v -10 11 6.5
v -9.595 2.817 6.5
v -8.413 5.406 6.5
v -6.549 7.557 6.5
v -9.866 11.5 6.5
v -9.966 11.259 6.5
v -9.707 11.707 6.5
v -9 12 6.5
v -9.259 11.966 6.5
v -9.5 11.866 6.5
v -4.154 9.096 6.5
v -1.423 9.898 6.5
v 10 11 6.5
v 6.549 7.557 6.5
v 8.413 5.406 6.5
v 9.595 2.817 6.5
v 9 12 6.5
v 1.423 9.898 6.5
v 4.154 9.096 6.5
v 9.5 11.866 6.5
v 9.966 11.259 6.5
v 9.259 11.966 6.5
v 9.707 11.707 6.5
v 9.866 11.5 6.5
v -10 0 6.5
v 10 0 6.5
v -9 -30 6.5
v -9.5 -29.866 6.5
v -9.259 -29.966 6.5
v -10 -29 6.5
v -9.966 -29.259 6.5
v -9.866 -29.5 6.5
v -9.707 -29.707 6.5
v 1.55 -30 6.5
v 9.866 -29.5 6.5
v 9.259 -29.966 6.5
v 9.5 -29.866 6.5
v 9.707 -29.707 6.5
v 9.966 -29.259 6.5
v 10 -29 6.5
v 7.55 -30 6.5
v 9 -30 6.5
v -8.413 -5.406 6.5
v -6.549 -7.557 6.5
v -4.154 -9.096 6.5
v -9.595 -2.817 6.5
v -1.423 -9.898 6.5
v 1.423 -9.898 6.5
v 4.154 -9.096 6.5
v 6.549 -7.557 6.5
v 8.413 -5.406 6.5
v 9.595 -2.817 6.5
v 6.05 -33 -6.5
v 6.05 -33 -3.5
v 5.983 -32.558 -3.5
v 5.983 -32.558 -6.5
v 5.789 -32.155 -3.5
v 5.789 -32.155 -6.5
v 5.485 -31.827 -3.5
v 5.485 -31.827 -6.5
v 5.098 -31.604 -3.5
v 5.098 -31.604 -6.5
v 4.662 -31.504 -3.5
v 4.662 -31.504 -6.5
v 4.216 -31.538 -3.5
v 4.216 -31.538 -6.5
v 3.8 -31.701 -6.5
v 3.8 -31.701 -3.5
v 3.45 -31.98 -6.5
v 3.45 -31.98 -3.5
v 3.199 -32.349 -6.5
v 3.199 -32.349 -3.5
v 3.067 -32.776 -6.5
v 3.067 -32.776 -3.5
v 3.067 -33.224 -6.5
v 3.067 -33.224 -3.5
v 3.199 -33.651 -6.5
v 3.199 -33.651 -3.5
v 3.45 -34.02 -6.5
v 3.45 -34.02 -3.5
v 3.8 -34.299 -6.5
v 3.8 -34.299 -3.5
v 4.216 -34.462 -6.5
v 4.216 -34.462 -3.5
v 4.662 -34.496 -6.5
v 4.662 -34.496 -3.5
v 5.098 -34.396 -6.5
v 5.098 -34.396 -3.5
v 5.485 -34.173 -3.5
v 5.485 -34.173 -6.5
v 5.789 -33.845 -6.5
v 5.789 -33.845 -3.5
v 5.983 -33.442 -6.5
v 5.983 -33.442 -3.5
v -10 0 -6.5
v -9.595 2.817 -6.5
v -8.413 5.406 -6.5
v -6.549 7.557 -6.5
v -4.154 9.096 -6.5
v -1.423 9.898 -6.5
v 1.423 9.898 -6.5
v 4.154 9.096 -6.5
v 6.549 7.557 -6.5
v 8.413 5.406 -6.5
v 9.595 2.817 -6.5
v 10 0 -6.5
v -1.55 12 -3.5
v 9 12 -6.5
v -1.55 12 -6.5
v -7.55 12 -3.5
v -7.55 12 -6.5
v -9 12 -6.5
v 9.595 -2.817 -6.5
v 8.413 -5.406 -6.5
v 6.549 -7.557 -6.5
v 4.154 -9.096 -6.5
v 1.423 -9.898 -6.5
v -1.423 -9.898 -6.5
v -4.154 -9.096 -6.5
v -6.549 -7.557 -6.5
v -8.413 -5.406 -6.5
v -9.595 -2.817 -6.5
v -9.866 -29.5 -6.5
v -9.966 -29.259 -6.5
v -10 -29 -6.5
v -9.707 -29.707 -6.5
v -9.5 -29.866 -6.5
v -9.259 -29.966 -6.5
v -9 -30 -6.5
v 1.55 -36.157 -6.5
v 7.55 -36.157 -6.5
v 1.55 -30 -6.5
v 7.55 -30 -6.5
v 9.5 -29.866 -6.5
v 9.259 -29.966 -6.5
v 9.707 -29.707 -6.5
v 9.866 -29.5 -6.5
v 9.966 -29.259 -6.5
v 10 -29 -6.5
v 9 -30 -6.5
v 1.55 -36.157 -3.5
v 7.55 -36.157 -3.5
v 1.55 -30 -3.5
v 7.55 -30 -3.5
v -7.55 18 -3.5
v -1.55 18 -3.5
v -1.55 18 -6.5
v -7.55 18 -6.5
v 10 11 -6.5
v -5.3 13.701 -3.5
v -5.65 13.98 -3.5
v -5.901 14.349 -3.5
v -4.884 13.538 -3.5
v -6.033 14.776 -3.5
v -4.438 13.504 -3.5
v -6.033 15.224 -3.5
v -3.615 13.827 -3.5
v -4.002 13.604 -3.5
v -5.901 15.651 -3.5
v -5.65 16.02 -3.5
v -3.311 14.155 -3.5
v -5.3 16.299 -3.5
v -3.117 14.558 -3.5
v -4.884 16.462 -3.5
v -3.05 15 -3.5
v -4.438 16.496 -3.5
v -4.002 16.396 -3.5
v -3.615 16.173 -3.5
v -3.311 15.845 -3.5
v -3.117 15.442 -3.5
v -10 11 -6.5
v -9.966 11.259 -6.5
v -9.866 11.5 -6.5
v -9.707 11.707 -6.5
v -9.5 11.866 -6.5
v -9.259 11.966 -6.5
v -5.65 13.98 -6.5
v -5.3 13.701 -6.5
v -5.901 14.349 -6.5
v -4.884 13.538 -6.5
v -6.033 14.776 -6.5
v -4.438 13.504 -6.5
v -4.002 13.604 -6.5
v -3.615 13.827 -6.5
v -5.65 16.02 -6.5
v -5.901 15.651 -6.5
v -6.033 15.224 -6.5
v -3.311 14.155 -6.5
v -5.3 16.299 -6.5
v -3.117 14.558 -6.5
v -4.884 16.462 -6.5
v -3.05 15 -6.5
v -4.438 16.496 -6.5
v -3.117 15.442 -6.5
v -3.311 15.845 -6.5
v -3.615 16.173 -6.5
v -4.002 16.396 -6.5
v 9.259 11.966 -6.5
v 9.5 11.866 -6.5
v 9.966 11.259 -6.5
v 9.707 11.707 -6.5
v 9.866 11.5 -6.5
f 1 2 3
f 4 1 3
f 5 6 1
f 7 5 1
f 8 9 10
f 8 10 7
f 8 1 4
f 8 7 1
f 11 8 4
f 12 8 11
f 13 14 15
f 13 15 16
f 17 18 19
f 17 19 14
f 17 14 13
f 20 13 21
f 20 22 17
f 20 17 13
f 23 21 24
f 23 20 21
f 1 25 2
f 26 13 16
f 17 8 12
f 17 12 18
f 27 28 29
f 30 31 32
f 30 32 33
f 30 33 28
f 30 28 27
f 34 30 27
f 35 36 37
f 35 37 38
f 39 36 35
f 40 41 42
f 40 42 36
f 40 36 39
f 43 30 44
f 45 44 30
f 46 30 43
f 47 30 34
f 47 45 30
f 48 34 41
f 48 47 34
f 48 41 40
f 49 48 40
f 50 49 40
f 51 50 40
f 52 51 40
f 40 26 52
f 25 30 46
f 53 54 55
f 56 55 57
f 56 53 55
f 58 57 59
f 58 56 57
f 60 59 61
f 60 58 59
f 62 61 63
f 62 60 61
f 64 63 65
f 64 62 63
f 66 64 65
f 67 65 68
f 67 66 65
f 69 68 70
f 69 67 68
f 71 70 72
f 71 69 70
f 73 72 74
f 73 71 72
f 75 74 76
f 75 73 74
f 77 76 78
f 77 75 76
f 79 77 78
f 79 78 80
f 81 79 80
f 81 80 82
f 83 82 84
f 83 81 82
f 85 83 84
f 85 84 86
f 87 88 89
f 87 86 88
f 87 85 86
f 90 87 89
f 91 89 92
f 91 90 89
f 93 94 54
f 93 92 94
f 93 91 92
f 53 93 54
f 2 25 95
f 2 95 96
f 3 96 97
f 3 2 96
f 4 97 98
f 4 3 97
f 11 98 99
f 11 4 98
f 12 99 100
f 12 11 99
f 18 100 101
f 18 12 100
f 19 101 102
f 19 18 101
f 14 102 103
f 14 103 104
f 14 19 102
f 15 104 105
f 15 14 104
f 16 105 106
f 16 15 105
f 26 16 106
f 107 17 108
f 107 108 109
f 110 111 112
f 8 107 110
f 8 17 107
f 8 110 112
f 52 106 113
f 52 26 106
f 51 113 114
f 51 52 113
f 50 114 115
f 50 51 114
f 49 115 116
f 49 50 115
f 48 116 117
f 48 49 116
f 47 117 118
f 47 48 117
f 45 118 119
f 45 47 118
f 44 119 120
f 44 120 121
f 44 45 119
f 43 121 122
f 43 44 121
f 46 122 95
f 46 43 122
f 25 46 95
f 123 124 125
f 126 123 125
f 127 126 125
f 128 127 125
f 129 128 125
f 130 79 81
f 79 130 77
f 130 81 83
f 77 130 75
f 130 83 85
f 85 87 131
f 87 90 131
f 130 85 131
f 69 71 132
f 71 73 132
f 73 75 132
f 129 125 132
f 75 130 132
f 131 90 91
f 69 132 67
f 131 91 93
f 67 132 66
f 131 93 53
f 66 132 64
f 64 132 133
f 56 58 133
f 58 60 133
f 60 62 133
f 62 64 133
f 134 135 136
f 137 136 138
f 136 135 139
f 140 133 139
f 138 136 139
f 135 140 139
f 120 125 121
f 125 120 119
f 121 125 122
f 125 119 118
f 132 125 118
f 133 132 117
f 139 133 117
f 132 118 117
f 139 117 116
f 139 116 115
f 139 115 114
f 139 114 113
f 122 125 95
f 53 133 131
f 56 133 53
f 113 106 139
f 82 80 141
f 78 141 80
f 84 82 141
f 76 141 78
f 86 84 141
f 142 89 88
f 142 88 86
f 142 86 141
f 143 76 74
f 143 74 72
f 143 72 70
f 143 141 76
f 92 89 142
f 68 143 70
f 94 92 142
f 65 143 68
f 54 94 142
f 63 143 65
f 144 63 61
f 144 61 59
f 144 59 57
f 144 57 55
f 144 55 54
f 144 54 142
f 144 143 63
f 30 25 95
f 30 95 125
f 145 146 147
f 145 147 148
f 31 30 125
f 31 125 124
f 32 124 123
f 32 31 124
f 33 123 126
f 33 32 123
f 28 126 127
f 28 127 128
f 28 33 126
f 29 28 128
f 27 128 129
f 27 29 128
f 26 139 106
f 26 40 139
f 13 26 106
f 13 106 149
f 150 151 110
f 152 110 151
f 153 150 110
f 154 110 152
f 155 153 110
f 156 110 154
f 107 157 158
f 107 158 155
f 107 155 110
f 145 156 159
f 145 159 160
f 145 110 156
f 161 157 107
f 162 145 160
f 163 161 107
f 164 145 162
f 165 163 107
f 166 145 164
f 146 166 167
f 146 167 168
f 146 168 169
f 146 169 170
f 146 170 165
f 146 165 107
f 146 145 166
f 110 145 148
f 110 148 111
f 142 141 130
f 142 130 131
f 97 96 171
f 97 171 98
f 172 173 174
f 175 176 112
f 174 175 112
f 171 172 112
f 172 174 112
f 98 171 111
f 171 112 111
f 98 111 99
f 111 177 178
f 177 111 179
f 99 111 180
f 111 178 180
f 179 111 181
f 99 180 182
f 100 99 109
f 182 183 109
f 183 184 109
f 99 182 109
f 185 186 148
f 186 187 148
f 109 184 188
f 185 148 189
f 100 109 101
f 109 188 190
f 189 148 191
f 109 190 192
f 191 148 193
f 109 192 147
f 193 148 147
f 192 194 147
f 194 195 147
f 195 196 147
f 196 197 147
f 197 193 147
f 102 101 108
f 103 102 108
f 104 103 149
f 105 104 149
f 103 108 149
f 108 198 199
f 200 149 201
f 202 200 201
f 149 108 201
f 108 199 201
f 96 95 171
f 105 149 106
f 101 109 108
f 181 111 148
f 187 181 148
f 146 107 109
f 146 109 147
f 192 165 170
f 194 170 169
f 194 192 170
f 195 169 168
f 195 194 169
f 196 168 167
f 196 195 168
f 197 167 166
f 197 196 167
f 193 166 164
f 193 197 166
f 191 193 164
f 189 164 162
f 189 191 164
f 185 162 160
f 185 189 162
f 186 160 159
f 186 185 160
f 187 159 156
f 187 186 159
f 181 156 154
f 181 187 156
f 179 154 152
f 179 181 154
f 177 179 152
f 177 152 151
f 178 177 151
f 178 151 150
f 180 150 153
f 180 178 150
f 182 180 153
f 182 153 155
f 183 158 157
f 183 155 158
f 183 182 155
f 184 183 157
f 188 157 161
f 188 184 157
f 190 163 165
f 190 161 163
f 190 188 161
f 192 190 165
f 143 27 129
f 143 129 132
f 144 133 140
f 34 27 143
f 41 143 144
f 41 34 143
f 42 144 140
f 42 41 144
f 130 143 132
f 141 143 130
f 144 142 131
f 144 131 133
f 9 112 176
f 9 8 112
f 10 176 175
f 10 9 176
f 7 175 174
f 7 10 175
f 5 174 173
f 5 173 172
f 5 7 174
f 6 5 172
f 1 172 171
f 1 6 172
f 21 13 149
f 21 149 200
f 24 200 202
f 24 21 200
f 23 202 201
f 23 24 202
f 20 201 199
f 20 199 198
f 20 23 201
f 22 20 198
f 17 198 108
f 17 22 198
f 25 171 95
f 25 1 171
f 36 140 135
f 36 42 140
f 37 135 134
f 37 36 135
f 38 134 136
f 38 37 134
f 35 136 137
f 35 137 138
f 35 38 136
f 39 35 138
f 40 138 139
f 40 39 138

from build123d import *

# Parameters (mm, degrees)
SKETCH1_R             = 1.5
BOSS_EXTRUDE2_DEPTH   = 6.5
BOSS_EXTRUDE2_2_DEPTH = 6.5
SKETCH3_W             = 6
SKETCH3_H             = 6
CUT_EXTRUDE1_DEPTH    = 10
SKETCH4_W             = 6
SKETCH4_H             = 6.157083321
CUT_EXTRUDE2_DEPTH    = 10


with BuildPart() as part:
    # Sketch1 → Boss-Extrude2 (new body, symmetric)
    with BuildSketch(Plane.XY):
        with BuildLine():
            ThreePointArc((10, 0), (0, -10), (-10, 0))
            Line((-10, 0), (-10, -29))
            ThreePointArc((-10, -29), (-9.707106781, -29.707106781), (-9, -30))
            Line((-9, -30), (1.55, -30))
            Line((1.55, -30), (1.55, -36.157083321))
            Line((1.55, -36.157083321), (7.55, -36.157083321))
            Line((7.55, -36.157083321), (7.55, -30))
            Line((7.55, -30), (9, -30))
            ThreePointArc((9, -30), (9.707106781, -29.707106781), (10, -29))
            Line((10, -29), (10, 0))
        make_face()
        with Locations((4.55, -33)):
            Circle(SKETCH1_R, mode=Mode.SUBTRACT)
    extrude(amount=BOSS_EXTRUDE2_DEPTH, both=True)

    # Sketch4 → Cut-Extrude2 (cut)
    with BuildSketch(Plane.XY.offset(6.5)):
        with Locations((4.55, -33.078541661)):
            Rectangle(SKETCH4_W, SKETCH4_H)
    extrude(amount=-CUT_EXTRUDE2_DEPTH, mode=Mode.SUBTRACT)


with BuildPart() as body_2:
    # Sketch1 → Boss-Extrude2 2 (new body, symmetric)
    with BuildSketch(Plane.XY):
        with BuildLine():
            Line((-10, 11), (-10, 0))
            ThreePointArc((-10, 0), (0, 10), (10, 0))
            Line((10, 0), (10, 11))
            ThreePointArc((10, 11), (9.707106781, 11.707106781), (9, 12))
            Line((9, 12), (-1.55, 12))
            Line((-1.55, 12), (-1.55, 18))
            Line((-1.55, 18), (-7.55, 18))
            Line((-7.55, 18), (-7.55, 12))
            Line((-7.55, 12), (-9, 12))
            ThreePointArc((-9, 12), (-9.707106781, 11.707106781), (-10, 11))
        make_face()
        with Locations((-4.55, 15)):
            Circle(SKETCH1_R, mode=Mode.SUBTRACT)
    extrude(amount=BOSS_EXTRUDE2_2_DEPTH, both=True)

    # Sketch3 → Cut-Extrude1 (cut)
    with BuildSketch(Plane.XY.offset(6.5)):
        with Locations((-4.55, 15)):
            Rectangle(SKETCH3_W, SKETCH3_H)
    extrude(amount=-CUT_EXTRUDE1_DEPTH, mode=Mode.SUBTRACT)


solid = Compound([part.part, body_2.part])
